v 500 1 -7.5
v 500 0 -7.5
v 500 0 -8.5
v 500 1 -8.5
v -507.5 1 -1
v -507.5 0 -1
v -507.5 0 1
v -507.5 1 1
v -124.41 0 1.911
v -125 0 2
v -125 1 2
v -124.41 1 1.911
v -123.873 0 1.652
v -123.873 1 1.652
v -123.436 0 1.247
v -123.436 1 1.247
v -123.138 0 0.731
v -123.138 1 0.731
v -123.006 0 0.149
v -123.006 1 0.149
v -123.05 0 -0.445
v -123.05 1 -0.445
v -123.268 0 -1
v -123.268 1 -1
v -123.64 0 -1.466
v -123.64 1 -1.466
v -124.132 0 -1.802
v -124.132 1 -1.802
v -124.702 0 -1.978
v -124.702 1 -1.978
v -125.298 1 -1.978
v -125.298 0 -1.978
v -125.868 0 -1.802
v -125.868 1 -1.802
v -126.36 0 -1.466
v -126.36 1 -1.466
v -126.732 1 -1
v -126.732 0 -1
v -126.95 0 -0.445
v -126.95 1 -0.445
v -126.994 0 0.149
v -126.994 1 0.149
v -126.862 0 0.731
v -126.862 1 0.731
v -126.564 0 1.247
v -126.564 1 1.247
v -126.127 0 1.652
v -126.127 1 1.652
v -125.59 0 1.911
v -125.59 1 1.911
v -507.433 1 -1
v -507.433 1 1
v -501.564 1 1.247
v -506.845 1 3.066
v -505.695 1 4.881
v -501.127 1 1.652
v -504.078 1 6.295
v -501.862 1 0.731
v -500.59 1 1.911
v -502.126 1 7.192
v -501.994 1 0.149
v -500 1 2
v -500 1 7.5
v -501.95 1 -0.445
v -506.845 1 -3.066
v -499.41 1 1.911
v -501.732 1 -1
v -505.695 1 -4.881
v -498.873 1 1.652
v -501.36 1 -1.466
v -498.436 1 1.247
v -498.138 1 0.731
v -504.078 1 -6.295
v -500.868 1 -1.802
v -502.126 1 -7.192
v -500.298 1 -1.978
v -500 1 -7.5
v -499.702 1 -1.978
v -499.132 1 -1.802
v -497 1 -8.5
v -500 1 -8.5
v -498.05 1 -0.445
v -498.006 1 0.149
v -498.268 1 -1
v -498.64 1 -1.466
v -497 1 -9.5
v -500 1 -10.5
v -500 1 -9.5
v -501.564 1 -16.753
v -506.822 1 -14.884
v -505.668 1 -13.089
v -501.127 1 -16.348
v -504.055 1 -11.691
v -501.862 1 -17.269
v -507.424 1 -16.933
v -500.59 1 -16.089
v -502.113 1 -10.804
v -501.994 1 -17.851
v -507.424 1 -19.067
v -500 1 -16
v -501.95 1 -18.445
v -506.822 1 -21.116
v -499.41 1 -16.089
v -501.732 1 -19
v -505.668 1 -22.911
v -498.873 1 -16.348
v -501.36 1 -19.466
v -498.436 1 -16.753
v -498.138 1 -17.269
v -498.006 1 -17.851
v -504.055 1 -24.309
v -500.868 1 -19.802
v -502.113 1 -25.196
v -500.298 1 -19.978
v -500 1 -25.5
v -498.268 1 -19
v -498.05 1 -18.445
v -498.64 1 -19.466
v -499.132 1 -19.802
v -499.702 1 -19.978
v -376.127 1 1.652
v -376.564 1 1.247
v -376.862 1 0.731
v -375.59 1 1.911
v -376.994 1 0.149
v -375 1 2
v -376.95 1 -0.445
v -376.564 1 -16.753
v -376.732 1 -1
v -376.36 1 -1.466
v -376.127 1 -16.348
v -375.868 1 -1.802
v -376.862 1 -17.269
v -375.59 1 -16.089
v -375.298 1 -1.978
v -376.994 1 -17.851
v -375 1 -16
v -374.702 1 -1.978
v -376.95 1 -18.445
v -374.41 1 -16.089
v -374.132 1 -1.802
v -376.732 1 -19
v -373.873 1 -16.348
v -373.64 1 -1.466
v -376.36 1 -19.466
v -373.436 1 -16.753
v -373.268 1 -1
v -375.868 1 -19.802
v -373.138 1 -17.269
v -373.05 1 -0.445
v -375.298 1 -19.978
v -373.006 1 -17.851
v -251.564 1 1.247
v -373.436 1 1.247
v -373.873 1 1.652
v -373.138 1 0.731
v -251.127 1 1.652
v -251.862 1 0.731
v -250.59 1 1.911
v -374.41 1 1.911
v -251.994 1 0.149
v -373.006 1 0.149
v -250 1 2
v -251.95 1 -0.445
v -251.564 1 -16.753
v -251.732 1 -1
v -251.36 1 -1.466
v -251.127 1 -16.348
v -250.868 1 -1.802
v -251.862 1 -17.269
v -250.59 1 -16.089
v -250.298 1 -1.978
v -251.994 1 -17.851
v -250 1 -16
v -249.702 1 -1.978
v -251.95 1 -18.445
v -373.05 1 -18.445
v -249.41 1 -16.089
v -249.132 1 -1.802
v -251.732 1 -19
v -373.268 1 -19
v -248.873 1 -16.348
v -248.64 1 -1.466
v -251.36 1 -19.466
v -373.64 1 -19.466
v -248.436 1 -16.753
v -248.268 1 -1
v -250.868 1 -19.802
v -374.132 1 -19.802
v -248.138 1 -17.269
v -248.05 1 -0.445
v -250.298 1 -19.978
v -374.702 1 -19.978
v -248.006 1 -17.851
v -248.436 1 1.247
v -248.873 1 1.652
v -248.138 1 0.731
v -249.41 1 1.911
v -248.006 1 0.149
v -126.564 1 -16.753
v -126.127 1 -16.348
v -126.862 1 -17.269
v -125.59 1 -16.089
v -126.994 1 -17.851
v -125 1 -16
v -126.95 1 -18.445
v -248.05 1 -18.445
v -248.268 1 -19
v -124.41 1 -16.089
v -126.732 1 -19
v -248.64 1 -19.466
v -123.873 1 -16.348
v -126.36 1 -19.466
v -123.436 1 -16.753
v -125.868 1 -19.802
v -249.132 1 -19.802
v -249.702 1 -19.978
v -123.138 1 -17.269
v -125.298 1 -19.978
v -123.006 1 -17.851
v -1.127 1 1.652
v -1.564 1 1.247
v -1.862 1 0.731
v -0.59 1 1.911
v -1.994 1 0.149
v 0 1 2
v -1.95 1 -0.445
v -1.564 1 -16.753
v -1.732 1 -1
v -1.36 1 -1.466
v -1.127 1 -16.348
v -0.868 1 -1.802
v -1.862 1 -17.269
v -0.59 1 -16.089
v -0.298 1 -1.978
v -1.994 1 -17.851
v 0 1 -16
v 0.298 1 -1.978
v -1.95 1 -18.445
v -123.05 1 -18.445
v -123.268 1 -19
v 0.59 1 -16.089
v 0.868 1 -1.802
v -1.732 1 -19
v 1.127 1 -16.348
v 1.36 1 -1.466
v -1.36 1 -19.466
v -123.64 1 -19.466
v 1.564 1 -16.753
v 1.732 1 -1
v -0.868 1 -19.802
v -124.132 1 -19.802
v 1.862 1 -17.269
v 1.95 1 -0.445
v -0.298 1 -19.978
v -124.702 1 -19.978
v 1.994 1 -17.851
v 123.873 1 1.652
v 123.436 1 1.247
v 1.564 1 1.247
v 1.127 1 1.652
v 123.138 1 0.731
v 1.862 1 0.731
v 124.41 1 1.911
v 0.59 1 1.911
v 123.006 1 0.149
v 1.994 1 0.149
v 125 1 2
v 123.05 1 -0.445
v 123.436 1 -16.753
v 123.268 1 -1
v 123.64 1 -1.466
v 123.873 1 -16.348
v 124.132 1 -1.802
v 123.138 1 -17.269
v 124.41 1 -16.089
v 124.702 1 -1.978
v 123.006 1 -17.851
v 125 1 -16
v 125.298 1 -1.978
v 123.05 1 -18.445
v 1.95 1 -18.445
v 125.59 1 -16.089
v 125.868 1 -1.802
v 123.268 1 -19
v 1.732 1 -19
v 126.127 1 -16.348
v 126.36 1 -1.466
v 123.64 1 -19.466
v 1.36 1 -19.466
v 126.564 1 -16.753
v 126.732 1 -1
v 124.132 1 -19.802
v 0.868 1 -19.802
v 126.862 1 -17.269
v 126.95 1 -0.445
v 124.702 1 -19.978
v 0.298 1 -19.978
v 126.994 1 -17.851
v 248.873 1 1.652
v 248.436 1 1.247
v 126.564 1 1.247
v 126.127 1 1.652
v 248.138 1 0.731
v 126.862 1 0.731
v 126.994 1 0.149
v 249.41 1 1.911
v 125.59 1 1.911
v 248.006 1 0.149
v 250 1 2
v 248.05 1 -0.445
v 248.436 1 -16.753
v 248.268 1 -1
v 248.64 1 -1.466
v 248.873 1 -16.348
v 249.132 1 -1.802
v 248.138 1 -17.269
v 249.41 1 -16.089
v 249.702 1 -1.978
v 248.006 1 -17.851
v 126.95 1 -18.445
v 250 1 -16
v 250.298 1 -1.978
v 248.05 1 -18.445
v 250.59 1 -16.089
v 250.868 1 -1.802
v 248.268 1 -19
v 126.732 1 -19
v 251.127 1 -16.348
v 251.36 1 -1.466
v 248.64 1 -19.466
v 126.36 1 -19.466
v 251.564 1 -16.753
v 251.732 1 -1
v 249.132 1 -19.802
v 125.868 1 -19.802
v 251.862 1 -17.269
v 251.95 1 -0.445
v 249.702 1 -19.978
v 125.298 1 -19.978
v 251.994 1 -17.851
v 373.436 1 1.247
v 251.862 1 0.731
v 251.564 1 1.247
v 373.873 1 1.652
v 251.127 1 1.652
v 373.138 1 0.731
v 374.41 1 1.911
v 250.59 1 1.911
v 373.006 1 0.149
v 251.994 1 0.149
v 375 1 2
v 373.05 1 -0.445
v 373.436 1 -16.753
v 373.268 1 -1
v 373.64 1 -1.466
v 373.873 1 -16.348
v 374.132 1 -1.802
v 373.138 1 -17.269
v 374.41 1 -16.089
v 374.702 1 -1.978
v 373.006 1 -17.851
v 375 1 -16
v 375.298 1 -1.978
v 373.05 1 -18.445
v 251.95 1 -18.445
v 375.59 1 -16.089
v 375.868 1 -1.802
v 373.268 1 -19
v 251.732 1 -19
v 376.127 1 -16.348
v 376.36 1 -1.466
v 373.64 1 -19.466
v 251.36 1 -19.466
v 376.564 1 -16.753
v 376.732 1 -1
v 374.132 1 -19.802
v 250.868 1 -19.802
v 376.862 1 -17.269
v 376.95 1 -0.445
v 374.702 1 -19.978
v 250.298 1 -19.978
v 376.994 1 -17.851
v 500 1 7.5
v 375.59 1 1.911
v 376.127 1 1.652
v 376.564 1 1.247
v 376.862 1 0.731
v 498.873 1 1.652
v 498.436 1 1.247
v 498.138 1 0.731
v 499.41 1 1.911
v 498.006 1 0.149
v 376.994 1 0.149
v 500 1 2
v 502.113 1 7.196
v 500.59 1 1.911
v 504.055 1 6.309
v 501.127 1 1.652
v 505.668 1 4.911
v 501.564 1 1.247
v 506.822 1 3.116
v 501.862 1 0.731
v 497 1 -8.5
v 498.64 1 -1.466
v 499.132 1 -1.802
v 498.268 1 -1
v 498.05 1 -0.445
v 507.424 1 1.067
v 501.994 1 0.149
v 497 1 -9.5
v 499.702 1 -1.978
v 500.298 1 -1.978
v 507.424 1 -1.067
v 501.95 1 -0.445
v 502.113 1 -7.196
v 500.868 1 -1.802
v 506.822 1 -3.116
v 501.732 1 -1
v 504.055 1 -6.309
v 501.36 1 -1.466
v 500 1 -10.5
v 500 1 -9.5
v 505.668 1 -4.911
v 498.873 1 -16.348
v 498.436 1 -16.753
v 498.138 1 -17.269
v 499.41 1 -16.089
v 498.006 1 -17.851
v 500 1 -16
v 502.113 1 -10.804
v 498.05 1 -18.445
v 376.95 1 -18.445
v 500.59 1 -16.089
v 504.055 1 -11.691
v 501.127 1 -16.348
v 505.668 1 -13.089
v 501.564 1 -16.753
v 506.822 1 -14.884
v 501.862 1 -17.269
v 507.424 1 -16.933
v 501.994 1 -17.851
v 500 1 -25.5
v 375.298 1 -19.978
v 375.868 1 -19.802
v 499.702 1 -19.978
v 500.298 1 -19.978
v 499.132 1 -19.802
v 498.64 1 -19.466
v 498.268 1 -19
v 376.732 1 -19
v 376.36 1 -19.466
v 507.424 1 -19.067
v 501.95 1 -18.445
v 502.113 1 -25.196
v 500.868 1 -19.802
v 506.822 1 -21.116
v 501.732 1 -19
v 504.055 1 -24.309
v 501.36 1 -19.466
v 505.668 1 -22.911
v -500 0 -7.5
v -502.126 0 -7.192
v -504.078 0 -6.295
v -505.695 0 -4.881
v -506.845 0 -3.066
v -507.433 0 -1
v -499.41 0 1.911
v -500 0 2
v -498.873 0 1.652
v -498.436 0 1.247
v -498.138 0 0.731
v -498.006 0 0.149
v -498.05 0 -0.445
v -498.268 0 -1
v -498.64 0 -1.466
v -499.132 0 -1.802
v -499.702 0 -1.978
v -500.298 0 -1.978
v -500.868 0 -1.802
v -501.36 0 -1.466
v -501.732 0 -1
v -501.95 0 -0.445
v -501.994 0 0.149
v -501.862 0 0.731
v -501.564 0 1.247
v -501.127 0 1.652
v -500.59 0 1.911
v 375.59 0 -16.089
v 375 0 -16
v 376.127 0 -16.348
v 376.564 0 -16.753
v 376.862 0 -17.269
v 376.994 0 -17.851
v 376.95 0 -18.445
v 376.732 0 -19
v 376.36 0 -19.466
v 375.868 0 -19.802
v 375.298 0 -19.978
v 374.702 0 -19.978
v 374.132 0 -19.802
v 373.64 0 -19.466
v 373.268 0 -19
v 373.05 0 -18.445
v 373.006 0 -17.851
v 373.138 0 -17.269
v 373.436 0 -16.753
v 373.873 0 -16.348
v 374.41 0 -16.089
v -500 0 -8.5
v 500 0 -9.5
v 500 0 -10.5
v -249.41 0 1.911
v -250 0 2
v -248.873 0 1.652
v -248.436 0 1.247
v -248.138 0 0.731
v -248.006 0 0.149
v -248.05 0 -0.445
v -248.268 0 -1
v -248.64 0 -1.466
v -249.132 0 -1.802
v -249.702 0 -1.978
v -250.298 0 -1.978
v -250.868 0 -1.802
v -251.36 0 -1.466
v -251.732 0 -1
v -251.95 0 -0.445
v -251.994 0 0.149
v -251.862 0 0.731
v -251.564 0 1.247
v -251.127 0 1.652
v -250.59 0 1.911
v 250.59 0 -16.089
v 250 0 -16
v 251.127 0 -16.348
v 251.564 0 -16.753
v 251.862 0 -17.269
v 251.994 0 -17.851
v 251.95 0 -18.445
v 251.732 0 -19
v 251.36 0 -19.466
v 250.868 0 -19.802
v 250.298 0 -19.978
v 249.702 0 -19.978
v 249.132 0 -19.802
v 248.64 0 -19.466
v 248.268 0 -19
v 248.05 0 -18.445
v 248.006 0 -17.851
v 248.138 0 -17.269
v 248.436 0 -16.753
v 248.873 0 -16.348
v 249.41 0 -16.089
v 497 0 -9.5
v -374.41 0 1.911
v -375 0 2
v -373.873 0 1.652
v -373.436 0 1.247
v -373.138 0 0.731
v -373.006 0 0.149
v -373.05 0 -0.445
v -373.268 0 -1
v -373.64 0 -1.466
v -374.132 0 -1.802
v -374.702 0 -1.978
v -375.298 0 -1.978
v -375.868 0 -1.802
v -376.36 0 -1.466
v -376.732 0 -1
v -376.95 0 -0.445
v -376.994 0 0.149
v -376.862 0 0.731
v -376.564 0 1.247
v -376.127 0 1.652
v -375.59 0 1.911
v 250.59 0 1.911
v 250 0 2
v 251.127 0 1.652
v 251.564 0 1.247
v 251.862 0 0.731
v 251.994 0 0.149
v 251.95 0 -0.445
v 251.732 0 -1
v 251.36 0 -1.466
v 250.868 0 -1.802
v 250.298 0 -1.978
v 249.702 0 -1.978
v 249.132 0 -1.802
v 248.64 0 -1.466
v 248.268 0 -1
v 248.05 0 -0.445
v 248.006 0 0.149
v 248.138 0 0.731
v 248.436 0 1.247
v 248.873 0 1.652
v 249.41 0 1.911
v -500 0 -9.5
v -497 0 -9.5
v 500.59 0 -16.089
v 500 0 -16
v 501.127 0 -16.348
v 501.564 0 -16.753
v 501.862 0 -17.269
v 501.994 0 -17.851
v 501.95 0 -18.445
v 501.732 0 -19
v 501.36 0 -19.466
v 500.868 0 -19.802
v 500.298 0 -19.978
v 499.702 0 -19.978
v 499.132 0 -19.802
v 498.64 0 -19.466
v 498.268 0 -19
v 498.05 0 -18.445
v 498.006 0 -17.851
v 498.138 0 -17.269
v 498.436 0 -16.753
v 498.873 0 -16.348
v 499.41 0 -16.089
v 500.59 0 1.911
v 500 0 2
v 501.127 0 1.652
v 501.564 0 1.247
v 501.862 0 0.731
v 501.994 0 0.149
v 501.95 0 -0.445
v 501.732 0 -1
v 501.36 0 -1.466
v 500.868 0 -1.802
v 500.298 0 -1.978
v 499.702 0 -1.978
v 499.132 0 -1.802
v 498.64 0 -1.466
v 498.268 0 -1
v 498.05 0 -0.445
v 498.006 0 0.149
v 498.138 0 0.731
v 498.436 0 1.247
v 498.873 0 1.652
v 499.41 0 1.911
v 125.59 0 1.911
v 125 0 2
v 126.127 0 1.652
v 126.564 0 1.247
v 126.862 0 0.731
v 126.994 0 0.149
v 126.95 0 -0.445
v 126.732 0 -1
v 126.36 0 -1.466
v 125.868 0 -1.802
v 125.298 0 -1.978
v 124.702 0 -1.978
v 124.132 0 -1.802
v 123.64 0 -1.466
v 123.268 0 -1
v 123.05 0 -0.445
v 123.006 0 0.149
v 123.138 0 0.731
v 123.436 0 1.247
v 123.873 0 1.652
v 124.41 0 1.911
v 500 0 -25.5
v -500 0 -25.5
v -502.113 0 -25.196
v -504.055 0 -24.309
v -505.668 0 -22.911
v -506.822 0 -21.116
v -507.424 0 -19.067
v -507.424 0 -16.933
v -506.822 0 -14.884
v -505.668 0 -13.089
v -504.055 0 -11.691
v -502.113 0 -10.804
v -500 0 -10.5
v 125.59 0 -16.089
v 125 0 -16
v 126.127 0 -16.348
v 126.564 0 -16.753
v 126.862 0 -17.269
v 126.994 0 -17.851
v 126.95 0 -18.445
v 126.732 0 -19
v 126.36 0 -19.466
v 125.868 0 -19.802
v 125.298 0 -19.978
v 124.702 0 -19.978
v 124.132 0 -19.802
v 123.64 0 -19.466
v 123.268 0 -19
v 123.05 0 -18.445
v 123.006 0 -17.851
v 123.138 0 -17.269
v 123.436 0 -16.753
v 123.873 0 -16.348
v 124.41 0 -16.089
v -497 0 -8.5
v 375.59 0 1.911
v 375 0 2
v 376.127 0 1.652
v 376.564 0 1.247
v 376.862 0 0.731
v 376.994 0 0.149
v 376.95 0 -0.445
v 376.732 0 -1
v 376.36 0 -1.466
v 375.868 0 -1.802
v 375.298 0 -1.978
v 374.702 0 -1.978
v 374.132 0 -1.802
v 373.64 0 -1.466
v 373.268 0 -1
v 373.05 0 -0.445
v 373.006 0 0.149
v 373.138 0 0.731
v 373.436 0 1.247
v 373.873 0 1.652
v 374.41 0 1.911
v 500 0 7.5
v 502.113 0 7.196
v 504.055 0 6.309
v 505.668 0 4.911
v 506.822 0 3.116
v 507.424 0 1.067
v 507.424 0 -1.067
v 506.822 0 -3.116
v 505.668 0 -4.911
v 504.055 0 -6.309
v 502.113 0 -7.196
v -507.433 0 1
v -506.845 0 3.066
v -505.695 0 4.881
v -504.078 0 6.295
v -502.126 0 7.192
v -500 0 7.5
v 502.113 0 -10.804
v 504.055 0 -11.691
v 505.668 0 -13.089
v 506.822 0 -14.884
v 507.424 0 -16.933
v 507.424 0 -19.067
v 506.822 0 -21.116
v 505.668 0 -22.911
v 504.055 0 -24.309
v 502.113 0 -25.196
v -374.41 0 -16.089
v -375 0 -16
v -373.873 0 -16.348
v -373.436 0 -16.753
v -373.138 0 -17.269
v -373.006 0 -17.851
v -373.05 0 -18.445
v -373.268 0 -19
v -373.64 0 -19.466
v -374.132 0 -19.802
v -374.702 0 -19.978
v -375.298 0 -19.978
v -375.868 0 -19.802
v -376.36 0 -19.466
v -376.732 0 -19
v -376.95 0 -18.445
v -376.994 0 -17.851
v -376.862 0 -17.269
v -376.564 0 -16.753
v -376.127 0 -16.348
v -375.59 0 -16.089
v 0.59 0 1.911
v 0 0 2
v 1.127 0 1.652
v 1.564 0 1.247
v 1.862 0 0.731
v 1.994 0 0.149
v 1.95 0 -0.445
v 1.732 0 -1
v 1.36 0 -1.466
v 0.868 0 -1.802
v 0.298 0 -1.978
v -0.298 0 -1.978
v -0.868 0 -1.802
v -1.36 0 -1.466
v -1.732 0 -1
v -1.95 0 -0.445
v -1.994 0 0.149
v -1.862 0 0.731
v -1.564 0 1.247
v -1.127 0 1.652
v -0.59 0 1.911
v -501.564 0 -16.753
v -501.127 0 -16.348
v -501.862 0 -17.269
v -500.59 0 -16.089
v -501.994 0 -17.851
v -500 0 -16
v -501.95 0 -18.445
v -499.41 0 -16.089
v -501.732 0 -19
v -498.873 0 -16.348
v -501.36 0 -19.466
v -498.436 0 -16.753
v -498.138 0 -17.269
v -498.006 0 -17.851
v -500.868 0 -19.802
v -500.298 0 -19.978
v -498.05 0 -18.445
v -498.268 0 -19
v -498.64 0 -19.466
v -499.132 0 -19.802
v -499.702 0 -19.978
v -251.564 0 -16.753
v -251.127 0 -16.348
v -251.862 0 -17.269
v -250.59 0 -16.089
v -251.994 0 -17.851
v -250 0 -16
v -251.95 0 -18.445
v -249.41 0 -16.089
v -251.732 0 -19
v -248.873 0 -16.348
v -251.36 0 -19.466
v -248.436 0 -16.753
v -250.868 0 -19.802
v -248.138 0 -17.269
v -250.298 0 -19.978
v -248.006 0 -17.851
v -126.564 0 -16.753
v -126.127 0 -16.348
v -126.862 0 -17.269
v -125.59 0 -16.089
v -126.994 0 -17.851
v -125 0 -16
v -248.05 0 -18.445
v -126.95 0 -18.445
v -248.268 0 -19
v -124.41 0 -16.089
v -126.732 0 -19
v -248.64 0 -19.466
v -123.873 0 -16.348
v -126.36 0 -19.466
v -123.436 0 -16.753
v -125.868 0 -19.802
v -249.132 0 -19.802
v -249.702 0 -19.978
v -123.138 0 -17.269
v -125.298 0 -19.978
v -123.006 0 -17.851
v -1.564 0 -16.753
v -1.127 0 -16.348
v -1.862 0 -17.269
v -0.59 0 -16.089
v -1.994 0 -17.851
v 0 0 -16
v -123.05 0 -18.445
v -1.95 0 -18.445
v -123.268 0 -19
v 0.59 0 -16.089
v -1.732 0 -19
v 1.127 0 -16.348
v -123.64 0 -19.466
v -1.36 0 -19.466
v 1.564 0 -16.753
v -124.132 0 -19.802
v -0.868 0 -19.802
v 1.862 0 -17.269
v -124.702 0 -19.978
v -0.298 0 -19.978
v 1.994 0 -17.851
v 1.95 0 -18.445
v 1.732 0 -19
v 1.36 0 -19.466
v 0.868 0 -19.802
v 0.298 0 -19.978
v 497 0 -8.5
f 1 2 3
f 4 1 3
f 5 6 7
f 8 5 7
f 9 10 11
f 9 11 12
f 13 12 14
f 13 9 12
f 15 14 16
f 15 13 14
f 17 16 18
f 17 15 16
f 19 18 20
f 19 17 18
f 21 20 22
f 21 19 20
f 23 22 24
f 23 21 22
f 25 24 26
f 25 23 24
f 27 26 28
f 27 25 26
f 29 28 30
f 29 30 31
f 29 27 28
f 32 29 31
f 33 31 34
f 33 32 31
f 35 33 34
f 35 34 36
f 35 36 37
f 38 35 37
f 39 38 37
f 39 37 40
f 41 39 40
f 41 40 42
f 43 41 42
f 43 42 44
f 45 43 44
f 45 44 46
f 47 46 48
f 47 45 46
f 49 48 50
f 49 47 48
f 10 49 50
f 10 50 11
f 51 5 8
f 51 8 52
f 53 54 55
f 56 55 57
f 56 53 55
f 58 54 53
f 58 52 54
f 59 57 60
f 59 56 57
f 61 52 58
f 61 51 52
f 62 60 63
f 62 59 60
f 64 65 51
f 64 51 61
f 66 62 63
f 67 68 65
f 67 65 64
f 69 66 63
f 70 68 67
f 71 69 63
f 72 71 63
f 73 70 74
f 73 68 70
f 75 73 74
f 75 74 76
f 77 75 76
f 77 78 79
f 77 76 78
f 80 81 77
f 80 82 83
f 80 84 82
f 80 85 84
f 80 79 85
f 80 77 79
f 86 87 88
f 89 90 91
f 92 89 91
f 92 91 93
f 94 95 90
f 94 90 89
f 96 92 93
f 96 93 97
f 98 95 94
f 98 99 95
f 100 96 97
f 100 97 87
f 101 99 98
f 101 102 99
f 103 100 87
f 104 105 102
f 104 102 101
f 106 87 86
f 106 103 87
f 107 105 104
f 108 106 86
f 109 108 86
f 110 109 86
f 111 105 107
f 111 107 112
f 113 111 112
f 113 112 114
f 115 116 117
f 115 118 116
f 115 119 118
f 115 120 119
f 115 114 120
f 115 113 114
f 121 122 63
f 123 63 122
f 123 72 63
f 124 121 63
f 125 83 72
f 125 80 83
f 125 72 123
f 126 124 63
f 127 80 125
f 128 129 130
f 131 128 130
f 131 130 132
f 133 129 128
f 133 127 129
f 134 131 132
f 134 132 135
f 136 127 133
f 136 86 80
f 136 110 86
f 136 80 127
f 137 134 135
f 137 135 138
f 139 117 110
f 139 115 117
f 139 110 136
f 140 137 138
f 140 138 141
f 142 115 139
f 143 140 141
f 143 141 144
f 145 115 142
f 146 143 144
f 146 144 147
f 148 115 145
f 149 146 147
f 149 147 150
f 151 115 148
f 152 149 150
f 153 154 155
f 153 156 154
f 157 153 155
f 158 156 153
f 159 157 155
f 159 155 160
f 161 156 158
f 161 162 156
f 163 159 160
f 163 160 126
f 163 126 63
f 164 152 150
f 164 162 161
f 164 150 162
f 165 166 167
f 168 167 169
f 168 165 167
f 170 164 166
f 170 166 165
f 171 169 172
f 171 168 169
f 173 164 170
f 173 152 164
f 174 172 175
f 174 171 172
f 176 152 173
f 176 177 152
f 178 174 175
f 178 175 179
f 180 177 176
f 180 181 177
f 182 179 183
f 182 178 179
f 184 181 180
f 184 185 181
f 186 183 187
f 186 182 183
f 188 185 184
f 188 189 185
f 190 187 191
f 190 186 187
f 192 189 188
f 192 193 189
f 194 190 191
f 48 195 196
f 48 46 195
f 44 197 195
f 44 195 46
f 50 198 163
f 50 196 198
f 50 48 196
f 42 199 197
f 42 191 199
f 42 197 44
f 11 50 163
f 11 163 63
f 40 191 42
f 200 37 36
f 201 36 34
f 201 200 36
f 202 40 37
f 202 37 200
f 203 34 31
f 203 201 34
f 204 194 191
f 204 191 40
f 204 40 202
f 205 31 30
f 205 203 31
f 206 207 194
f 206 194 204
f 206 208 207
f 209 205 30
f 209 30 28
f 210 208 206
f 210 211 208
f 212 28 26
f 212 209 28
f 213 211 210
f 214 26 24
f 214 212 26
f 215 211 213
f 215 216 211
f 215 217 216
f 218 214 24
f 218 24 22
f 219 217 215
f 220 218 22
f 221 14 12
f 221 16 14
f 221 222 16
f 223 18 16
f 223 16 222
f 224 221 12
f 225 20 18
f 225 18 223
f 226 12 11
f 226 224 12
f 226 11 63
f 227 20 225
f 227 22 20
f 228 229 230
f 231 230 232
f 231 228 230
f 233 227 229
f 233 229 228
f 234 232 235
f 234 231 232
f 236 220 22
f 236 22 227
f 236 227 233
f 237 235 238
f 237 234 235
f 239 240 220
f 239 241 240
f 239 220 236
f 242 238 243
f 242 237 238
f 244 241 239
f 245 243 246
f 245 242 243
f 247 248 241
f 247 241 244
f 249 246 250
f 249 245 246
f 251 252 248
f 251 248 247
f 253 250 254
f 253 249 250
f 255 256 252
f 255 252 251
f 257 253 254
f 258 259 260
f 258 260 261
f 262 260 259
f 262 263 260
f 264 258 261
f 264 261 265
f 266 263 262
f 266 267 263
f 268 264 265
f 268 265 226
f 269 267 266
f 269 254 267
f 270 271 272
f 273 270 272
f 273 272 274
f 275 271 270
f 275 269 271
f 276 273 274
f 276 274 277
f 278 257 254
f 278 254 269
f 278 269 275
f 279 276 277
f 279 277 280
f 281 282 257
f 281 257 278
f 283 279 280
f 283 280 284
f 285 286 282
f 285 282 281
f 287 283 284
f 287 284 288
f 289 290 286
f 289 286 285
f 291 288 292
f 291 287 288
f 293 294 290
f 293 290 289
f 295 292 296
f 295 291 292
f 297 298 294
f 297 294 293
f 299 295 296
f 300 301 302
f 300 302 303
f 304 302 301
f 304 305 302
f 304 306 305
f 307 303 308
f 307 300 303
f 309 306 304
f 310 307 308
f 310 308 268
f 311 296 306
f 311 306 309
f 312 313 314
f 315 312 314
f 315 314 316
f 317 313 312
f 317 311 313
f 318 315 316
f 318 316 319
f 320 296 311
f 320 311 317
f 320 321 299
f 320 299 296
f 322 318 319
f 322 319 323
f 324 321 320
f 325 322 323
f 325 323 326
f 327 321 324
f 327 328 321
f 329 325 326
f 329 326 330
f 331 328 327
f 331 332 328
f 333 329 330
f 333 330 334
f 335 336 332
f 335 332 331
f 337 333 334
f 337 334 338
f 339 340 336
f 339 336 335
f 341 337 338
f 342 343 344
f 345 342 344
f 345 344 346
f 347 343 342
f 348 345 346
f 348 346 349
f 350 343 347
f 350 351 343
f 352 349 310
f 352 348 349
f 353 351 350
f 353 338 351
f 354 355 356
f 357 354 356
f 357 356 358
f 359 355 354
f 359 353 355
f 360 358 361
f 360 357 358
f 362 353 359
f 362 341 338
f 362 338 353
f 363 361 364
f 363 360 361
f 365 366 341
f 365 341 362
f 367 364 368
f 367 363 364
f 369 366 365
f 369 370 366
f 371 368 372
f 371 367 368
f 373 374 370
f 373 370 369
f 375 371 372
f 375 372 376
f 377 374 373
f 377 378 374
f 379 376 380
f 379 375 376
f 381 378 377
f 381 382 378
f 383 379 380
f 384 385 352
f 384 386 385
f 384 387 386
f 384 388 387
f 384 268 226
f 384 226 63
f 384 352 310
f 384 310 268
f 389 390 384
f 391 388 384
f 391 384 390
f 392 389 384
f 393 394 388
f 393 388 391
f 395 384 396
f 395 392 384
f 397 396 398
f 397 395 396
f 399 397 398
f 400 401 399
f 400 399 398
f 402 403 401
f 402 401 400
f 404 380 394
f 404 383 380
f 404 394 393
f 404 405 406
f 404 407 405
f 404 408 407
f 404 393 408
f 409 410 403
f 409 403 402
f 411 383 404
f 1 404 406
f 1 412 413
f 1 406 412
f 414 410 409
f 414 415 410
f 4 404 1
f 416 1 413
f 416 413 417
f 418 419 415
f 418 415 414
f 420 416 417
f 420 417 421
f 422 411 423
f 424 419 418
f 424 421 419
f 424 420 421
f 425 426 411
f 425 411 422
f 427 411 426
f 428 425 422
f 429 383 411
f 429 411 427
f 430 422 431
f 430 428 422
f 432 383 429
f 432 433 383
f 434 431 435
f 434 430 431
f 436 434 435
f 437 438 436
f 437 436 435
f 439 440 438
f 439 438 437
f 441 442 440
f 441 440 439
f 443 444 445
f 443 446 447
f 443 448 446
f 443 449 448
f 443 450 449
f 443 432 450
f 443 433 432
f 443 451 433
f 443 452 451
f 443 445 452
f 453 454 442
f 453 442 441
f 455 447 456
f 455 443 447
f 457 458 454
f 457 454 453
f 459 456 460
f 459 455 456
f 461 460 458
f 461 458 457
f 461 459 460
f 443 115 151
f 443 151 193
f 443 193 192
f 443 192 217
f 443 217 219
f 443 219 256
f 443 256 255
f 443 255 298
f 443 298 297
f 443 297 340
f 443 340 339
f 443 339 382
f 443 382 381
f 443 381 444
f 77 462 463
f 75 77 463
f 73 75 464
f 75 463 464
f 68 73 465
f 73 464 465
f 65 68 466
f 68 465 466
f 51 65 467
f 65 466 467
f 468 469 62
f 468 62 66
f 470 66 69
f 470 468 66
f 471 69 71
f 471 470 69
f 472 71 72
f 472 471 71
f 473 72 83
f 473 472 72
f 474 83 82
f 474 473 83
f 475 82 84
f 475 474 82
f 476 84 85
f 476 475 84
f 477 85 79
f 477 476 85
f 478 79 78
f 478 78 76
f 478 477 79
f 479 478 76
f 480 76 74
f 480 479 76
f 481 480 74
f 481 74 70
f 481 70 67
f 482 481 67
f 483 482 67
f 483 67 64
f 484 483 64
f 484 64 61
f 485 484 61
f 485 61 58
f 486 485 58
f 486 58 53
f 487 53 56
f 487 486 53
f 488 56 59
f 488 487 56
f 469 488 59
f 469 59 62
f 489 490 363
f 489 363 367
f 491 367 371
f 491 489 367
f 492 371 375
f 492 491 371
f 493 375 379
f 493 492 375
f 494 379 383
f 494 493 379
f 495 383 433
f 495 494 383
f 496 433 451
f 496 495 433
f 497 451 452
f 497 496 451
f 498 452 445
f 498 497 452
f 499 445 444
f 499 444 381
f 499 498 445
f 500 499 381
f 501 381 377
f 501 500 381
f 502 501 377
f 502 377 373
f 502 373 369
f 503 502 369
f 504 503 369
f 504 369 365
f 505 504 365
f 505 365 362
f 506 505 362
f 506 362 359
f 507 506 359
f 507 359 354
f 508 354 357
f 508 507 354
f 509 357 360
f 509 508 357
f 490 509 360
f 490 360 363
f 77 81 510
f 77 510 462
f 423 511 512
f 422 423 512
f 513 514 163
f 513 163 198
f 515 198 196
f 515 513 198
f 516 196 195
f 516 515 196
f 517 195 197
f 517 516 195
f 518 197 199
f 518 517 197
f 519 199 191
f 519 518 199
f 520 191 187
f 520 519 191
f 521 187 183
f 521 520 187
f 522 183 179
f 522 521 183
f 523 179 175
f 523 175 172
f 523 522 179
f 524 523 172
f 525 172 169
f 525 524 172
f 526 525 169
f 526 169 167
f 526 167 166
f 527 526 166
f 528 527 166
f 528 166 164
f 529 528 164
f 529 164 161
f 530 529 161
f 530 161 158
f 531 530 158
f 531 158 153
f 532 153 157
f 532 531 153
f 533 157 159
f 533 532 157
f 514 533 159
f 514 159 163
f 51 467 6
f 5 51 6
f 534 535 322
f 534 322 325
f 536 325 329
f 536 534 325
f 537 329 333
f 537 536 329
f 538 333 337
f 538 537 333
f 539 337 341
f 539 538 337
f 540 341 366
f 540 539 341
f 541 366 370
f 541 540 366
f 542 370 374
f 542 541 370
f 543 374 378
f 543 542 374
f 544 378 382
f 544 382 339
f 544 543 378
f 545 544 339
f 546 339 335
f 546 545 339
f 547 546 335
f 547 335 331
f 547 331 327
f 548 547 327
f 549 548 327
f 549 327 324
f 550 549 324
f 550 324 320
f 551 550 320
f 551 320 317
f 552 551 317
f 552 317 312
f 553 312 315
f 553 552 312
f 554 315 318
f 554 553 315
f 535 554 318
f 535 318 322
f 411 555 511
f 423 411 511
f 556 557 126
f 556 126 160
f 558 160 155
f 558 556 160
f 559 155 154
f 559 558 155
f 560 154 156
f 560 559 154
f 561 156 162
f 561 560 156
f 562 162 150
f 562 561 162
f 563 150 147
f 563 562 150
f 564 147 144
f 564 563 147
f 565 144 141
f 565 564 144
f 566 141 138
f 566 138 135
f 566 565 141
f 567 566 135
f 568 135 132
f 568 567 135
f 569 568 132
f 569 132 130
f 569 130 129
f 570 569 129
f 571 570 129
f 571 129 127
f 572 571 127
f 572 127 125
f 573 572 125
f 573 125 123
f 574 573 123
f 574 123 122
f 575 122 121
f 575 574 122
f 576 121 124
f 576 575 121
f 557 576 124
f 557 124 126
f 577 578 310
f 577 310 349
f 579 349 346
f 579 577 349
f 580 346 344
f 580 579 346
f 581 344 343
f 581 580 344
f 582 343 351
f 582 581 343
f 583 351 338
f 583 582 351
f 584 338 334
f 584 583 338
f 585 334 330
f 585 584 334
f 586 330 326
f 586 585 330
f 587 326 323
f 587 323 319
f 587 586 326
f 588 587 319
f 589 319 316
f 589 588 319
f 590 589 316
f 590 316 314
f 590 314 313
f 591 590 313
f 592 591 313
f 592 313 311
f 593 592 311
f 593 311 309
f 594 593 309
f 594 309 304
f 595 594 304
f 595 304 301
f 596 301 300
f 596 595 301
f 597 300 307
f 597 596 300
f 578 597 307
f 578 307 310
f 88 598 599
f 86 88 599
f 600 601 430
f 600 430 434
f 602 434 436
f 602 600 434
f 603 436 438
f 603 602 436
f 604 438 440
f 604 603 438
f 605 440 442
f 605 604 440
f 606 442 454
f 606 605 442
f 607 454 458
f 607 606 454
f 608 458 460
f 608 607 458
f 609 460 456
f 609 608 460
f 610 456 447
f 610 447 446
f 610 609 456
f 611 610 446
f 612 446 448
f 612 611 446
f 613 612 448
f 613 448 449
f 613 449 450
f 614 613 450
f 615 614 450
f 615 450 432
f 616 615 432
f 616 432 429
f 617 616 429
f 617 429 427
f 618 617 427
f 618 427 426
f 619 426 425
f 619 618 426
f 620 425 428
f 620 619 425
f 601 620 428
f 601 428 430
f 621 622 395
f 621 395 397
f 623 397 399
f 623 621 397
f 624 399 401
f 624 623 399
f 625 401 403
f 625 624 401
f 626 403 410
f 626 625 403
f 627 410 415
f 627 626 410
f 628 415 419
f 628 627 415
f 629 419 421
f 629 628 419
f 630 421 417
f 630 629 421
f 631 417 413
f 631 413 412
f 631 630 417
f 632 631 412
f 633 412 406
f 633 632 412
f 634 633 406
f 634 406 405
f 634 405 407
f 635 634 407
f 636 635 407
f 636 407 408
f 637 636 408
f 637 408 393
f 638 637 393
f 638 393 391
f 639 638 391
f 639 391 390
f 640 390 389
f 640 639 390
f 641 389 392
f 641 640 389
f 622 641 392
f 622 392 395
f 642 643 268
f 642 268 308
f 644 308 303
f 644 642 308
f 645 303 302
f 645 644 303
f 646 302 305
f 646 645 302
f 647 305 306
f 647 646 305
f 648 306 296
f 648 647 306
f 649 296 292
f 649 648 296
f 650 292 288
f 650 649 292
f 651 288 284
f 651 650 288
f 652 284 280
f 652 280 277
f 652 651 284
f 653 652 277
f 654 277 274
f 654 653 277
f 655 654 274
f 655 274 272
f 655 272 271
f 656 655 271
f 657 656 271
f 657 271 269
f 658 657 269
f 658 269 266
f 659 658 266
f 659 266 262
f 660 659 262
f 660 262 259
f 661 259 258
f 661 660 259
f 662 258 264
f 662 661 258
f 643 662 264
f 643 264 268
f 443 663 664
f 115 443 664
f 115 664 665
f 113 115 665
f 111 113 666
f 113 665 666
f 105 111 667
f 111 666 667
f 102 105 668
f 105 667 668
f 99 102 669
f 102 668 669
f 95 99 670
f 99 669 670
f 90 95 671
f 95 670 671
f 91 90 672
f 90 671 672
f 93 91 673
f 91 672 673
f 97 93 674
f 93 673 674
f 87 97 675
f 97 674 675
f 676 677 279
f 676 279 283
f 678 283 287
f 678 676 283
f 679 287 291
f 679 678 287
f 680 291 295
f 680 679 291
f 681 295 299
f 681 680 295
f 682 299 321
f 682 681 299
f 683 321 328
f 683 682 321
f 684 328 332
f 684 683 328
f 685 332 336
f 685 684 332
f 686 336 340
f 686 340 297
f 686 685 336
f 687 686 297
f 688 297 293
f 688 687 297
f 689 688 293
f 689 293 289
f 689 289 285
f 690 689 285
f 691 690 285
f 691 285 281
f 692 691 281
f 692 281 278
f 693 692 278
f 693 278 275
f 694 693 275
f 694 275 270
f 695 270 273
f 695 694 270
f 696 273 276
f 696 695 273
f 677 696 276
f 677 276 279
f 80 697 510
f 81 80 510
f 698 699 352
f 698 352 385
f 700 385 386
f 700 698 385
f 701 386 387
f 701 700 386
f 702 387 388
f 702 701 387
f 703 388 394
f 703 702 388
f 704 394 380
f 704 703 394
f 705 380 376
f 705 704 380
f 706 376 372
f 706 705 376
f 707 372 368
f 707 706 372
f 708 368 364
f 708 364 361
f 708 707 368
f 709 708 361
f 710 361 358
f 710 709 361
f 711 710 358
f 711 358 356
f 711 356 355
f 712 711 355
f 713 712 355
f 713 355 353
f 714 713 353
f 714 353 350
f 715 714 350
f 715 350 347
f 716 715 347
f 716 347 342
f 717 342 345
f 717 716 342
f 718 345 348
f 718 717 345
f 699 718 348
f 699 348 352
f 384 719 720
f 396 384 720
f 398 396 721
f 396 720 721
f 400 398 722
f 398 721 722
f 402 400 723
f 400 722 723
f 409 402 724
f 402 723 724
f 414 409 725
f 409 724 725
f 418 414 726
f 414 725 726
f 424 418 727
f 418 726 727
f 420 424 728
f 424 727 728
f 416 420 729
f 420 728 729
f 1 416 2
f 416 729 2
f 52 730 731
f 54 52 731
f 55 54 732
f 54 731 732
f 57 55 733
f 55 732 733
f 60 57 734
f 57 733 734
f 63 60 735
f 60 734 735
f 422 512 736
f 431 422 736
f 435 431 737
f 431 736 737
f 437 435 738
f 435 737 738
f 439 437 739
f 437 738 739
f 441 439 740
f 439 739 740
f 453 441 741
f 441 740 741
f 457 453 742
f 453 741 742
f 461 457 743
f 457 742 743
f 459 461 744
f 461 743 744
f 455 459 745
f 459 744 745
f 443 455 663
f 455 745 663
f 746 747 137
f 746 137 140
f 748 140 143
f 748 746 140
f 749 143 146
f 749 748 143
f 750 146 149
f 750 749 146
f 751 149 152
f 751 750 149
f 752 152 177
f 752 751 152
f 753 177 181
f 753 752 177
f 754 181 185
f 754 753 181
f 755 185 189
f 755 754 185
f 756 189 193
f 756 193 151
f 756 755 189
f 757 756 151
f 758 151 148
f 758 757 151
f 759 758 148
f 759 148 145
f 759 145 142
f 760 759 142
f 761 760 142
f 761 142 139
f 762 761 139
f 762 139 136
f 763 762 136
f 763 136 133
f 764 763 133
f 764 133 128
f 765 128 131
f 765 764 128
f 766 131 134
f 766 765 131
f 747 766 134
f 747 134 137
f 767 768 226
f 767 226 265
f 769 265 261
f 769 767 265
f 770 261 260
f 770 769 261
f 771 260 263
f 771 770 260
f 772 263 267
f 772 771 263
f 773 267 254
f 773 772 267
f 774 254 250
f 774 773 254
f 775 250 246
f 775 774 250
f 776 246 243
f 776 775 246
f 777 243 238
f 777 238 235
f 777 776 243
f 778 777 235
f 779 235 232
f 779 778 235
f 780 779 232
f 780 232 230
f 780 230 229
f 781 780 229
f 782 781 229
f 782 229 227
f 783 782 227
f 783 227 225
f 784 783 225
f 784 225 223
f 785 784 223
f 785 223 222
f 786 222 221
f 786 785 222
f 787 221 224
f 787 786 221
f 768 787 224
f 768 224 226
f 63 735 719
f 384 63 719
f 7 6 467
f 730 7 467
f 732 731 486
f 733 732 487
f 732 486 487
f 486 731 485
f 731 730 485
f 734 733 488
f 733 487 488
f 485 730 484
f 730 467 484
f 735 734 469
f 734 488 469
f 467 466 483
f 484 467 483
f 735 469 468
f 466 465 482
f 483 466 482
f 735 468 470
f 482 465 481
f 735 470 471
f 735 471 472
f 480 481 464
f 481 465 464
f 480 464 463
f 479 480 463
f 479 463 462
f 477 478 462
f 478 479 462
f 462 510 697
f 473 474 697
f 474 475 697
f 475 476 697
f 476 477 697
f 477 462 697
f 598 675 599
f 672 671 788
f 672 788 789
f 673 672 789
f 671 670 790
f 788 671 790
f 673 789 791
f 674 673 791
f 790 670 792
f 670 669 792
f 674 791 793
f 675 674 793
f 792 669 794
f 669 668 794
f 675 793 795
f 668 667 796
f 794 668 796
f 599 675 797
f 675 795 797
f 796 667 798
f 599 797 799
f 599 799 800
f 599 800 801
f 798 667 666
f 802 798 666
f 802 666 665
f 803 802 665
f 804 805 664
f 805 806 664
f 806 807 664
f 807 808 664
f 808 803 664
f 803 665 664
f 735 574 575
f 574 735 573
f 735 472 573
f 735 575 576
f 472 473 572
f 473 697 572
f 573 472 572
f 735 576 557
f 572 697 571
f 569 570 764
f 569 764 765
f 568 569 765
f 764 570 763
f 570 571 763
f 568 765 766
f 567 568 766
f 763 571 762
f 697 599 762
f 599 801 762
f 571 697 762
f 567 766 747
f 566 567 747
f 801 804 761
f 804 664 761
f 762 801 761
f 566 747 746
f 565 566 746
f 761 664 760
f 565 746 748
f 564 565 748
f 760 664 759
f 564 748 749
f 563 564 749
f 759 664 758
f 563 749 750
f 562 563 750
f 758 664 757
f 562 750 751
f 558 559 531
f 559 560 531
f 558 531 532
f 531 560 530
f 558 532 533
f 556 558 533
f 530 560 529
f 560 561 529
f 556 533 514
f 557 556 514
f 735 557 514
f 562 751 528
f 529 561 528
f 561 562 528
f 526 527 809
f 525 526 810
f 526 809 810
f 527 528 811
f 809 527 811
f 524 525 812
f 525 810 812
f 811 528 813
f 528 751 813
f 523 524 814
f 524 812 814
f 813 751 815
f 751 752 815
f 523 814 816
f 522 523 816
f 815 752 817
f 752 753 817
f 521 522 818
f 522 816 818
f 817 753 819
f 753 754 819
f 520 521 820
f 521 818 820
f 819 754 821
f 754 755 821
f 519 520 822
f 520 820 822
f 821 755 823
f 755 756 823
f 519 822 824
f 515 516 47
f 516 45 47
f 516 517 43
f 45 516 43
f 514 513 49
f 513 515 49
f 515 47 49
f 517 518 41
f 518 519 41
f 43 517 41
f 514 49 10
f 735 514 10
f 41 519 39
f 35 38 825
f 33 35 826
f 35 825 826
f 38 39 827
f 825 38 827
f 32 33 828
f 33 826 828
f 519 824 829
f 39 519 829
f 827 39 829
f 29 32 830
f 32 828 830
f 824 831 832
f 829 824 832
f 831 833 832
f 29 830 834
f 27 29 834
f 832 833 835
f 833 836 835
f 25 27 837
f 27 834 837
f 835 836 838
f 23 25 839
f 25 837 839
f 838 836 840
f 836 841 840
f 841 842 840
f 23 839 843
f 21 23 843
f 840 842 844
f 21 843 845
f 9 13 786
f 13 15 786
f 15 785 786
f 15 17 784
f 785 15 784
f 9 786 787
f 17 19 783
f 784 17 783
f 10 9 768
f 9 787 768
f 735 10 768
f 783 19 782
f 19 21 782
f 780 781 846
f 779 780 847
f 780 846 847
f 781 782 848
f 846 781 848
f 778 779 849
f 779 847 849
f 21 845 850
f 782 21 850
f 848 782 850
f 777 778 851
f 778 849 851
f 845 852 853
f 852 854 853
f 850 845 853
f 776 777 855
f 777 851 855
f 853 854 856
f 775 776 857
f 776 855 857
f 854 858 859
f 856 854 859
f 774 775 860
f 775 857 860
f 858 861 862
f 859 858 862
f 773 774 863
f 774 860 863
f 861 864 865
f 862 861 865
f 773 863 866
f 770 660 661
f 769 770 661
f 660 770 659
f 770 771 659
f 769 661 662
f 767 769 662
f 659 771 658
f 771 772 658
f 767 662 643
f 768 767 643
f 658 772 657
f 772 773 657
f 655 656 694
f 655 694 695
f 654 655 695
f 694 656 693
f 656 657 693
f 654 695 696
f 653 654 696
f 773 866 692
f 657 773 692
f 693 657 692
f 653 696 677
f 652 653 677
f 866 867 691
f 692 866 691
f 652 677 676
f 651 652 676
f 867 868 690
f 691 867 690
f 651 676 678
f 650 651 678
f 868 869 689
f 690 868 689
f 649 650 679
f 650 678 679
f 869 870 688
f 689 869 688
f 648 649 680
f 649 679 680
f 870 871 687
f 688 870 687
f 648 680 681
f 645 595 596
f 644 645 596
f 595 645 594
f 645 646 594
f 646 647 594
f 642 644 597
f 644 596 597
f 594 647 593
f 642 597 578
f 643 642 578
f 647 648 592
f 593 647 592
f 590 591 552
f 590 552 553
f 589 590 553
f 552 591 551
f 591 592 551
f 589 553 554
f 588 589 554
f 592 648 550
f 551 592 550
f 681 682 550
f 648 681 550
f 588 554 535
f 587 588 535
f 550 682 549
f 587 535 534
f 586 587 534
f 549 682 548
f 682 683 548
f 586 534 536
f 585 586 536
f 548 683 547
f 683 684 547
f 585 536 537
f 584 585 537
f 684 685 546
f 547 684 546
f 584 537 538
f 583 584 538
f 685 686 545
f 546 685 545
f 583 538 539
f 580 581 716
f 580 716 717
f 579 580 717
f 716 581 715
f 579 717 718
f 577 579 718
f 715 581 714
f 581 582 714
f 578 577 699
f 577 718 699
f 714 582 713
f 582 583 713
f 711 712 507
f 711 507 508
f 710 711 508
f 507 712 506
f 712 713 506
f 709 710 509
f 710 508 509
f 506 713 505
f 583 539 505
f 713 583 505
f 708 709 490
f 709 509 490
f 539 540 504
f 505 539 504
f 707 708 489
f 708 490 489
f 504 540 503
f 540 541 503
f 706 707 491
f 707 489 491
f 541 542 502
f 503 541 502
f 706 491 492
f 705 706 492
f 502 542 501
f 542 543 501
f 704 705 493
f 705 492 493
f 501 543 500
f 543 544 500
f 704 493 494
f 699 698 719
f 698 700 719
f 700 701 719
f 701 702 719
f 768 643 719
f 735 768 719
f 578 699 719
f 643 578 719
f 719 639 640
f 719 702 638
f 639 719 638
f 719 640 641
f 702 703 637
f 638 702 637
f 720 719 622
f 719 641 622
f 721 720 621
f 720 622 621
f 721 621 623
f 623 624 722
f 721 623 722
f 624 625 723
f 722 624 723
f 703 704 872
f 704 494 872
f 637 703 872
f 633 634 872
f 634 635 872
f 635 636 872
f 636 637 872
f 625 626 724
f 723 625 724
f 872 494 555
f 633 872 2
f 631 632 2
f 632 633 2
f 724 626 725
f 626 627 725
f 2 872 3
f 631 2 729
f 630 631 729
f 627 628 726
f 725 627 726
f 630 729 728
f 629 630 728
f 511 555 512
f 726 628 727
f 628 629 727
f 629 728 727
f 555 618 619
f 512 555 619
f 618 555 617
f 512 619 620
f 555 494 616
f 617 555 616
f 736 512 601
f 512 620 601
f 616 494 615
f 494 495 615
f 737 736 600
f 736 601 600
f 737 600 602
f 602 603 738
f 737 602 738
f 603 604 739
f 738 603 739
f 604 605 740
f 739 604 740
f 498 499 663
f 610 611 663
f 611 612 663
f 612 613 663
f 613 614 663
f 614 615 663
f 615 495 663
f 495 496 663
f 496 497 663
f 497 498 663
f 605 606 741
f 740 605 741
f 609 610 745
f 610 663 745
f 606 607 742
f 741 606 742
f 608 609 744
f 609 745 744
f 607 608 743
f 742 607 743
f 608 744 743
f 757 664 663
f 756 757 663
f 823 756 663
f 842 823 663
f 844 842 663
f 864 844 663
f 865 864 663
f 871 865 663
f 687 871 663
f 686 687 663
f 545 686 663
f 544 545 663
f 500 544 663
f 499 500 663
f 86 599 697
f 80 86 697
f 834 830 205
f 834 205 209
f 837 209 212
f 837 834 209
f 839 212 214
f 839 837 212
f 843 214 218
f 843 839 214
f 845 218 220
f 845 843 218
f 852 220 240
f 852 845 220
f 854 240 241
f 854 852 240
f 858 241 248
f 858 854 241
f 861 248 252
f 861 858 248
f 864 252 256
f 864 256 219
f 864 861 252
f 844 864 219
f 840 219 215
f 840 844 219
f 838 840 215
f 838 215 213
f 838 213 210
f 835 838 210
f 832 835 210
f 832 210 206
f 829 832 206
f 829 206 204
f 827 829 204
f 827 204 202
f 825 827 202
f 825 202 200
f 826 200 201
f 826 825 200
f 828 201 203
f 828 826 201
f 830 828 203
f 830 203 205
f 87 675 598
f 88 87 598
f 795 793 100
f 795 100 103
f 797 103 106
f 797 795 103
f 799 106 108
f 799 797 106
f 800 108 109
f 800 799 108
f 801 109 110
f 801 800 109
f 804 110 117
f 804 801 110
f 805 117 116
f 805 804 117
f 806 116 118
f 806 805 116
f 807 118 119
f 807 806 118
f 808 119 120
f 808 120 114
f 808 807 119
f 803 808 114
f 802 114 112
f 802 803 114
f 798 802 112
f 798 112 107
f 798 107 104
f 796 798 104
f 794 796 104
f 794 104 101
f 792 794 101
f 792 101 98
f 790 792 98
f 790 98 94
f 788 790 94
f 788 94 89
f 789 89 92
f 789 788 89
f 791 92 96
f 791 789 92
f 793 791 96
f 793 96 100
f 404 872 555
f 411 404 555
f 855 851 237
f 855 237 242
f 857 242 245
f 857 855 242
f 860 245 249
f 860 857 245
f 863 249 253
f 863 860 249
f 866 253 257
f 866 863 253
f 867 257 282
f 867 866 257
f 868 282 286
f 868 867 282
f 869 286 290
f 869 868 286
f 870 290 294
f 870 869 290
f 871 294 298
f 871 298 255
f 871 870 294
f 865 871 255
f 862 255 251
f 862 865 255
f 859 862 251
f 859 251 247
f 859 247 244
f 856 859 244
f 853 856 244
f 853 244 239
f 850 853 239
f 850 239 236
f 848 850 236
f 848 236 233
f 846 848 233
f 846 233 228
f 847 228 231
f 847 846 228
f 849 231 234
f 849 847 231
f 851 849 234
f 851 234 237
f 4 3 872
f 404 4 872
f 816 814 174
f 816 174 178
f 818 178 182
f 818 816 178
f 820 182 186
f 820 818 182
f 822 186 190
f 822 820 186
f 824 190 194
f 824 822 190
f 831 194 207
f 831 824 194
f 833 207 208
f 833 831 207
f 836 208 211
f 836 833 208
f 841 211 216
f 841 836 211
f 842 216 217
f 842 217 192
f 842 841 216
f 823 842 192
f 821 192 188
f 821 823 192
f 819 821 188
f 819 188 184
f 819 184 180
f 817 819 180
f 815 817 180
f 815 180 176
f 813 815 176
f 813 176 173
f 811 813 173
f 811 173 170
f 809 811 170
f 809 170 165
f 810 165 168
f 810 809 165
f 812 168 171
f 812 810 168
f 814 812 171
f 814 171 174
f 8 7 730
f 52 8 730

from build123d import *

# Parameters (mm, degrees)
SKETCH1_R           = 2
BOSS_EXTRUDE1_DEPTH = 1


with BuildPart() as part:
    # Sketch1 → Boss-Extrude1 (new body)
    with BuildSketch(Plane(origin=(0, 0, 0), x_dir=(1, 0, 0), z_dir=(0, 1, 0))):
        with BuildLine():
            Line((-500, -7.5), (500, -7.5))
            ThreePointArc((500, -7.5), (507.5, 0), (500, 7.5))
            Line((500, 7.5), (500, 8.5))
            Line((500, 8.5), (497, 8.5))
            Line((497, 8.5), (497, 9.5))
            Line((497, 9.5), (500, 9.5))
            Line((500, 9.5), (500, 10.5))
            ThreePointArc((500, 10.5), (507.5, 18), (500, 25.5))
            Line((500, 25.5), (-500, 25.5))
            ThreePointArc((-500, 25.5), (-507.5, 18), (-500, 10.5))
            Line((-500, 10.5), (-500, 9.5))
            Line((-500, 9.5), (-497, 9.5))
            Line((-497, 9.5), (-497, 8.5))
            Line((-497, 8.5), (-500, 8.5))
            Line((-500, 8.5), (-500, 7.5))
            ThreePointArc((-500, 7.5), (-504.937104415, 5.645794895), (-507.433034374, 1))
            Line((-507.433034374, 1), (-507.5, 1))
            Line((-507.5, 1), (-507.5, -1))
            Line((-507.5, -1), (-507.433034374, -1))
            ThreePointArc((-507.433034374, -1), (-504.937104415, -5.645794895), (-500, -7.5))
        make_face()
        with Locations(Location((0, 0, 0), (0, 0, 270))):
            Circle(SKETCH1_R, mode=Mode.SUBTRACT)
        with Locations(Location((125, 0, 0), (0, 0, 270))):
            Circle(SKETCH1_R, mode=Mode.SUBTRACT)
        with Locations(Location((250, 0, 0), (0, 0, 270))):
            Circle(SKETCH1_R, mode=Mode.SUBTRACT)
        with Locations(Location((375, 0, 0), (0, 0, 270))):
            Circle(SKETCH1_R, mode=Mode.SUBTRACT)
        with Locations(Location((500, 0, 0), (0, 0, 270))):
            Circle(SKETCH1_R, mode=Mode.SUBTRACT)
        with Locations(Location((-125, 0, 0), (0, 0, 270))):
            Circle(SKETCH1_R, mode=Mode.SUBTRACT)
        with Locations(Location((-250, 0, 0), (0, 0, 270))):
            Circle(SKETCH1_R, mode=Mode.SUBTRACT)
        with Locations(Location((-375, 0, 0), (0, 0, 270))):
            Circle(SKETCH1_R, mode=Mode.SUBTRACT)
        with Locations(Location((-500, 0, 0), (0, 0, 270))):
            Circle(SKETCH1_R, mode=Mode.SUBTRACT)
        with Locations(Location((0, 18, 0), (0, 0, 270))):
            Circle(SKETCH1_R, mode=Mode.SUBTRACT)
        with Locations(Location((125, 18, 0), (0, 0, 270))):
            Circle(SKETCH1_R, mode=Mode.SUBTRACT)
        with Locations(Location((250, 18, 0), (0, 0, 270))):
            Circle(SKETCH1_R, mode=Mode.SUBTRACT)
        with Locations(Location((375, 18, 0), (0, 0, 270))):
            Circle(SKETCH1_R, mode=Mode.SUBTRACT)
        with Locations(Location((500, 18, 0), (0, 0, 270))):
            Circle(SKETCH1_R, mode=Mode.SUBTRACT)
        with Locations(Location((-125, 18, 0), (0, 0, 270))):
            Circle(SKETCH1_R, mode=Mode.SUBTRACT)
        with Locations(Location((-250, 18, 0), (0, 0, 270))):
            Circle(SKETCH1_R, mode=Mode.SUBTRACT)
        with Locations(Location((-375, 18, 0), (0, 0, 270))):
            Circle(SKETCH1_R, mode=Mode.SUBTRACT)
        with Locations(Location((-500, 18, 0), (0, 0, 270))):
            Circle(SKETCH1_R, mode=Mode.SUBTRACT)
    extrude(amount=BOSS_EXTRUDE1_DEPTH)


solid = part.part
